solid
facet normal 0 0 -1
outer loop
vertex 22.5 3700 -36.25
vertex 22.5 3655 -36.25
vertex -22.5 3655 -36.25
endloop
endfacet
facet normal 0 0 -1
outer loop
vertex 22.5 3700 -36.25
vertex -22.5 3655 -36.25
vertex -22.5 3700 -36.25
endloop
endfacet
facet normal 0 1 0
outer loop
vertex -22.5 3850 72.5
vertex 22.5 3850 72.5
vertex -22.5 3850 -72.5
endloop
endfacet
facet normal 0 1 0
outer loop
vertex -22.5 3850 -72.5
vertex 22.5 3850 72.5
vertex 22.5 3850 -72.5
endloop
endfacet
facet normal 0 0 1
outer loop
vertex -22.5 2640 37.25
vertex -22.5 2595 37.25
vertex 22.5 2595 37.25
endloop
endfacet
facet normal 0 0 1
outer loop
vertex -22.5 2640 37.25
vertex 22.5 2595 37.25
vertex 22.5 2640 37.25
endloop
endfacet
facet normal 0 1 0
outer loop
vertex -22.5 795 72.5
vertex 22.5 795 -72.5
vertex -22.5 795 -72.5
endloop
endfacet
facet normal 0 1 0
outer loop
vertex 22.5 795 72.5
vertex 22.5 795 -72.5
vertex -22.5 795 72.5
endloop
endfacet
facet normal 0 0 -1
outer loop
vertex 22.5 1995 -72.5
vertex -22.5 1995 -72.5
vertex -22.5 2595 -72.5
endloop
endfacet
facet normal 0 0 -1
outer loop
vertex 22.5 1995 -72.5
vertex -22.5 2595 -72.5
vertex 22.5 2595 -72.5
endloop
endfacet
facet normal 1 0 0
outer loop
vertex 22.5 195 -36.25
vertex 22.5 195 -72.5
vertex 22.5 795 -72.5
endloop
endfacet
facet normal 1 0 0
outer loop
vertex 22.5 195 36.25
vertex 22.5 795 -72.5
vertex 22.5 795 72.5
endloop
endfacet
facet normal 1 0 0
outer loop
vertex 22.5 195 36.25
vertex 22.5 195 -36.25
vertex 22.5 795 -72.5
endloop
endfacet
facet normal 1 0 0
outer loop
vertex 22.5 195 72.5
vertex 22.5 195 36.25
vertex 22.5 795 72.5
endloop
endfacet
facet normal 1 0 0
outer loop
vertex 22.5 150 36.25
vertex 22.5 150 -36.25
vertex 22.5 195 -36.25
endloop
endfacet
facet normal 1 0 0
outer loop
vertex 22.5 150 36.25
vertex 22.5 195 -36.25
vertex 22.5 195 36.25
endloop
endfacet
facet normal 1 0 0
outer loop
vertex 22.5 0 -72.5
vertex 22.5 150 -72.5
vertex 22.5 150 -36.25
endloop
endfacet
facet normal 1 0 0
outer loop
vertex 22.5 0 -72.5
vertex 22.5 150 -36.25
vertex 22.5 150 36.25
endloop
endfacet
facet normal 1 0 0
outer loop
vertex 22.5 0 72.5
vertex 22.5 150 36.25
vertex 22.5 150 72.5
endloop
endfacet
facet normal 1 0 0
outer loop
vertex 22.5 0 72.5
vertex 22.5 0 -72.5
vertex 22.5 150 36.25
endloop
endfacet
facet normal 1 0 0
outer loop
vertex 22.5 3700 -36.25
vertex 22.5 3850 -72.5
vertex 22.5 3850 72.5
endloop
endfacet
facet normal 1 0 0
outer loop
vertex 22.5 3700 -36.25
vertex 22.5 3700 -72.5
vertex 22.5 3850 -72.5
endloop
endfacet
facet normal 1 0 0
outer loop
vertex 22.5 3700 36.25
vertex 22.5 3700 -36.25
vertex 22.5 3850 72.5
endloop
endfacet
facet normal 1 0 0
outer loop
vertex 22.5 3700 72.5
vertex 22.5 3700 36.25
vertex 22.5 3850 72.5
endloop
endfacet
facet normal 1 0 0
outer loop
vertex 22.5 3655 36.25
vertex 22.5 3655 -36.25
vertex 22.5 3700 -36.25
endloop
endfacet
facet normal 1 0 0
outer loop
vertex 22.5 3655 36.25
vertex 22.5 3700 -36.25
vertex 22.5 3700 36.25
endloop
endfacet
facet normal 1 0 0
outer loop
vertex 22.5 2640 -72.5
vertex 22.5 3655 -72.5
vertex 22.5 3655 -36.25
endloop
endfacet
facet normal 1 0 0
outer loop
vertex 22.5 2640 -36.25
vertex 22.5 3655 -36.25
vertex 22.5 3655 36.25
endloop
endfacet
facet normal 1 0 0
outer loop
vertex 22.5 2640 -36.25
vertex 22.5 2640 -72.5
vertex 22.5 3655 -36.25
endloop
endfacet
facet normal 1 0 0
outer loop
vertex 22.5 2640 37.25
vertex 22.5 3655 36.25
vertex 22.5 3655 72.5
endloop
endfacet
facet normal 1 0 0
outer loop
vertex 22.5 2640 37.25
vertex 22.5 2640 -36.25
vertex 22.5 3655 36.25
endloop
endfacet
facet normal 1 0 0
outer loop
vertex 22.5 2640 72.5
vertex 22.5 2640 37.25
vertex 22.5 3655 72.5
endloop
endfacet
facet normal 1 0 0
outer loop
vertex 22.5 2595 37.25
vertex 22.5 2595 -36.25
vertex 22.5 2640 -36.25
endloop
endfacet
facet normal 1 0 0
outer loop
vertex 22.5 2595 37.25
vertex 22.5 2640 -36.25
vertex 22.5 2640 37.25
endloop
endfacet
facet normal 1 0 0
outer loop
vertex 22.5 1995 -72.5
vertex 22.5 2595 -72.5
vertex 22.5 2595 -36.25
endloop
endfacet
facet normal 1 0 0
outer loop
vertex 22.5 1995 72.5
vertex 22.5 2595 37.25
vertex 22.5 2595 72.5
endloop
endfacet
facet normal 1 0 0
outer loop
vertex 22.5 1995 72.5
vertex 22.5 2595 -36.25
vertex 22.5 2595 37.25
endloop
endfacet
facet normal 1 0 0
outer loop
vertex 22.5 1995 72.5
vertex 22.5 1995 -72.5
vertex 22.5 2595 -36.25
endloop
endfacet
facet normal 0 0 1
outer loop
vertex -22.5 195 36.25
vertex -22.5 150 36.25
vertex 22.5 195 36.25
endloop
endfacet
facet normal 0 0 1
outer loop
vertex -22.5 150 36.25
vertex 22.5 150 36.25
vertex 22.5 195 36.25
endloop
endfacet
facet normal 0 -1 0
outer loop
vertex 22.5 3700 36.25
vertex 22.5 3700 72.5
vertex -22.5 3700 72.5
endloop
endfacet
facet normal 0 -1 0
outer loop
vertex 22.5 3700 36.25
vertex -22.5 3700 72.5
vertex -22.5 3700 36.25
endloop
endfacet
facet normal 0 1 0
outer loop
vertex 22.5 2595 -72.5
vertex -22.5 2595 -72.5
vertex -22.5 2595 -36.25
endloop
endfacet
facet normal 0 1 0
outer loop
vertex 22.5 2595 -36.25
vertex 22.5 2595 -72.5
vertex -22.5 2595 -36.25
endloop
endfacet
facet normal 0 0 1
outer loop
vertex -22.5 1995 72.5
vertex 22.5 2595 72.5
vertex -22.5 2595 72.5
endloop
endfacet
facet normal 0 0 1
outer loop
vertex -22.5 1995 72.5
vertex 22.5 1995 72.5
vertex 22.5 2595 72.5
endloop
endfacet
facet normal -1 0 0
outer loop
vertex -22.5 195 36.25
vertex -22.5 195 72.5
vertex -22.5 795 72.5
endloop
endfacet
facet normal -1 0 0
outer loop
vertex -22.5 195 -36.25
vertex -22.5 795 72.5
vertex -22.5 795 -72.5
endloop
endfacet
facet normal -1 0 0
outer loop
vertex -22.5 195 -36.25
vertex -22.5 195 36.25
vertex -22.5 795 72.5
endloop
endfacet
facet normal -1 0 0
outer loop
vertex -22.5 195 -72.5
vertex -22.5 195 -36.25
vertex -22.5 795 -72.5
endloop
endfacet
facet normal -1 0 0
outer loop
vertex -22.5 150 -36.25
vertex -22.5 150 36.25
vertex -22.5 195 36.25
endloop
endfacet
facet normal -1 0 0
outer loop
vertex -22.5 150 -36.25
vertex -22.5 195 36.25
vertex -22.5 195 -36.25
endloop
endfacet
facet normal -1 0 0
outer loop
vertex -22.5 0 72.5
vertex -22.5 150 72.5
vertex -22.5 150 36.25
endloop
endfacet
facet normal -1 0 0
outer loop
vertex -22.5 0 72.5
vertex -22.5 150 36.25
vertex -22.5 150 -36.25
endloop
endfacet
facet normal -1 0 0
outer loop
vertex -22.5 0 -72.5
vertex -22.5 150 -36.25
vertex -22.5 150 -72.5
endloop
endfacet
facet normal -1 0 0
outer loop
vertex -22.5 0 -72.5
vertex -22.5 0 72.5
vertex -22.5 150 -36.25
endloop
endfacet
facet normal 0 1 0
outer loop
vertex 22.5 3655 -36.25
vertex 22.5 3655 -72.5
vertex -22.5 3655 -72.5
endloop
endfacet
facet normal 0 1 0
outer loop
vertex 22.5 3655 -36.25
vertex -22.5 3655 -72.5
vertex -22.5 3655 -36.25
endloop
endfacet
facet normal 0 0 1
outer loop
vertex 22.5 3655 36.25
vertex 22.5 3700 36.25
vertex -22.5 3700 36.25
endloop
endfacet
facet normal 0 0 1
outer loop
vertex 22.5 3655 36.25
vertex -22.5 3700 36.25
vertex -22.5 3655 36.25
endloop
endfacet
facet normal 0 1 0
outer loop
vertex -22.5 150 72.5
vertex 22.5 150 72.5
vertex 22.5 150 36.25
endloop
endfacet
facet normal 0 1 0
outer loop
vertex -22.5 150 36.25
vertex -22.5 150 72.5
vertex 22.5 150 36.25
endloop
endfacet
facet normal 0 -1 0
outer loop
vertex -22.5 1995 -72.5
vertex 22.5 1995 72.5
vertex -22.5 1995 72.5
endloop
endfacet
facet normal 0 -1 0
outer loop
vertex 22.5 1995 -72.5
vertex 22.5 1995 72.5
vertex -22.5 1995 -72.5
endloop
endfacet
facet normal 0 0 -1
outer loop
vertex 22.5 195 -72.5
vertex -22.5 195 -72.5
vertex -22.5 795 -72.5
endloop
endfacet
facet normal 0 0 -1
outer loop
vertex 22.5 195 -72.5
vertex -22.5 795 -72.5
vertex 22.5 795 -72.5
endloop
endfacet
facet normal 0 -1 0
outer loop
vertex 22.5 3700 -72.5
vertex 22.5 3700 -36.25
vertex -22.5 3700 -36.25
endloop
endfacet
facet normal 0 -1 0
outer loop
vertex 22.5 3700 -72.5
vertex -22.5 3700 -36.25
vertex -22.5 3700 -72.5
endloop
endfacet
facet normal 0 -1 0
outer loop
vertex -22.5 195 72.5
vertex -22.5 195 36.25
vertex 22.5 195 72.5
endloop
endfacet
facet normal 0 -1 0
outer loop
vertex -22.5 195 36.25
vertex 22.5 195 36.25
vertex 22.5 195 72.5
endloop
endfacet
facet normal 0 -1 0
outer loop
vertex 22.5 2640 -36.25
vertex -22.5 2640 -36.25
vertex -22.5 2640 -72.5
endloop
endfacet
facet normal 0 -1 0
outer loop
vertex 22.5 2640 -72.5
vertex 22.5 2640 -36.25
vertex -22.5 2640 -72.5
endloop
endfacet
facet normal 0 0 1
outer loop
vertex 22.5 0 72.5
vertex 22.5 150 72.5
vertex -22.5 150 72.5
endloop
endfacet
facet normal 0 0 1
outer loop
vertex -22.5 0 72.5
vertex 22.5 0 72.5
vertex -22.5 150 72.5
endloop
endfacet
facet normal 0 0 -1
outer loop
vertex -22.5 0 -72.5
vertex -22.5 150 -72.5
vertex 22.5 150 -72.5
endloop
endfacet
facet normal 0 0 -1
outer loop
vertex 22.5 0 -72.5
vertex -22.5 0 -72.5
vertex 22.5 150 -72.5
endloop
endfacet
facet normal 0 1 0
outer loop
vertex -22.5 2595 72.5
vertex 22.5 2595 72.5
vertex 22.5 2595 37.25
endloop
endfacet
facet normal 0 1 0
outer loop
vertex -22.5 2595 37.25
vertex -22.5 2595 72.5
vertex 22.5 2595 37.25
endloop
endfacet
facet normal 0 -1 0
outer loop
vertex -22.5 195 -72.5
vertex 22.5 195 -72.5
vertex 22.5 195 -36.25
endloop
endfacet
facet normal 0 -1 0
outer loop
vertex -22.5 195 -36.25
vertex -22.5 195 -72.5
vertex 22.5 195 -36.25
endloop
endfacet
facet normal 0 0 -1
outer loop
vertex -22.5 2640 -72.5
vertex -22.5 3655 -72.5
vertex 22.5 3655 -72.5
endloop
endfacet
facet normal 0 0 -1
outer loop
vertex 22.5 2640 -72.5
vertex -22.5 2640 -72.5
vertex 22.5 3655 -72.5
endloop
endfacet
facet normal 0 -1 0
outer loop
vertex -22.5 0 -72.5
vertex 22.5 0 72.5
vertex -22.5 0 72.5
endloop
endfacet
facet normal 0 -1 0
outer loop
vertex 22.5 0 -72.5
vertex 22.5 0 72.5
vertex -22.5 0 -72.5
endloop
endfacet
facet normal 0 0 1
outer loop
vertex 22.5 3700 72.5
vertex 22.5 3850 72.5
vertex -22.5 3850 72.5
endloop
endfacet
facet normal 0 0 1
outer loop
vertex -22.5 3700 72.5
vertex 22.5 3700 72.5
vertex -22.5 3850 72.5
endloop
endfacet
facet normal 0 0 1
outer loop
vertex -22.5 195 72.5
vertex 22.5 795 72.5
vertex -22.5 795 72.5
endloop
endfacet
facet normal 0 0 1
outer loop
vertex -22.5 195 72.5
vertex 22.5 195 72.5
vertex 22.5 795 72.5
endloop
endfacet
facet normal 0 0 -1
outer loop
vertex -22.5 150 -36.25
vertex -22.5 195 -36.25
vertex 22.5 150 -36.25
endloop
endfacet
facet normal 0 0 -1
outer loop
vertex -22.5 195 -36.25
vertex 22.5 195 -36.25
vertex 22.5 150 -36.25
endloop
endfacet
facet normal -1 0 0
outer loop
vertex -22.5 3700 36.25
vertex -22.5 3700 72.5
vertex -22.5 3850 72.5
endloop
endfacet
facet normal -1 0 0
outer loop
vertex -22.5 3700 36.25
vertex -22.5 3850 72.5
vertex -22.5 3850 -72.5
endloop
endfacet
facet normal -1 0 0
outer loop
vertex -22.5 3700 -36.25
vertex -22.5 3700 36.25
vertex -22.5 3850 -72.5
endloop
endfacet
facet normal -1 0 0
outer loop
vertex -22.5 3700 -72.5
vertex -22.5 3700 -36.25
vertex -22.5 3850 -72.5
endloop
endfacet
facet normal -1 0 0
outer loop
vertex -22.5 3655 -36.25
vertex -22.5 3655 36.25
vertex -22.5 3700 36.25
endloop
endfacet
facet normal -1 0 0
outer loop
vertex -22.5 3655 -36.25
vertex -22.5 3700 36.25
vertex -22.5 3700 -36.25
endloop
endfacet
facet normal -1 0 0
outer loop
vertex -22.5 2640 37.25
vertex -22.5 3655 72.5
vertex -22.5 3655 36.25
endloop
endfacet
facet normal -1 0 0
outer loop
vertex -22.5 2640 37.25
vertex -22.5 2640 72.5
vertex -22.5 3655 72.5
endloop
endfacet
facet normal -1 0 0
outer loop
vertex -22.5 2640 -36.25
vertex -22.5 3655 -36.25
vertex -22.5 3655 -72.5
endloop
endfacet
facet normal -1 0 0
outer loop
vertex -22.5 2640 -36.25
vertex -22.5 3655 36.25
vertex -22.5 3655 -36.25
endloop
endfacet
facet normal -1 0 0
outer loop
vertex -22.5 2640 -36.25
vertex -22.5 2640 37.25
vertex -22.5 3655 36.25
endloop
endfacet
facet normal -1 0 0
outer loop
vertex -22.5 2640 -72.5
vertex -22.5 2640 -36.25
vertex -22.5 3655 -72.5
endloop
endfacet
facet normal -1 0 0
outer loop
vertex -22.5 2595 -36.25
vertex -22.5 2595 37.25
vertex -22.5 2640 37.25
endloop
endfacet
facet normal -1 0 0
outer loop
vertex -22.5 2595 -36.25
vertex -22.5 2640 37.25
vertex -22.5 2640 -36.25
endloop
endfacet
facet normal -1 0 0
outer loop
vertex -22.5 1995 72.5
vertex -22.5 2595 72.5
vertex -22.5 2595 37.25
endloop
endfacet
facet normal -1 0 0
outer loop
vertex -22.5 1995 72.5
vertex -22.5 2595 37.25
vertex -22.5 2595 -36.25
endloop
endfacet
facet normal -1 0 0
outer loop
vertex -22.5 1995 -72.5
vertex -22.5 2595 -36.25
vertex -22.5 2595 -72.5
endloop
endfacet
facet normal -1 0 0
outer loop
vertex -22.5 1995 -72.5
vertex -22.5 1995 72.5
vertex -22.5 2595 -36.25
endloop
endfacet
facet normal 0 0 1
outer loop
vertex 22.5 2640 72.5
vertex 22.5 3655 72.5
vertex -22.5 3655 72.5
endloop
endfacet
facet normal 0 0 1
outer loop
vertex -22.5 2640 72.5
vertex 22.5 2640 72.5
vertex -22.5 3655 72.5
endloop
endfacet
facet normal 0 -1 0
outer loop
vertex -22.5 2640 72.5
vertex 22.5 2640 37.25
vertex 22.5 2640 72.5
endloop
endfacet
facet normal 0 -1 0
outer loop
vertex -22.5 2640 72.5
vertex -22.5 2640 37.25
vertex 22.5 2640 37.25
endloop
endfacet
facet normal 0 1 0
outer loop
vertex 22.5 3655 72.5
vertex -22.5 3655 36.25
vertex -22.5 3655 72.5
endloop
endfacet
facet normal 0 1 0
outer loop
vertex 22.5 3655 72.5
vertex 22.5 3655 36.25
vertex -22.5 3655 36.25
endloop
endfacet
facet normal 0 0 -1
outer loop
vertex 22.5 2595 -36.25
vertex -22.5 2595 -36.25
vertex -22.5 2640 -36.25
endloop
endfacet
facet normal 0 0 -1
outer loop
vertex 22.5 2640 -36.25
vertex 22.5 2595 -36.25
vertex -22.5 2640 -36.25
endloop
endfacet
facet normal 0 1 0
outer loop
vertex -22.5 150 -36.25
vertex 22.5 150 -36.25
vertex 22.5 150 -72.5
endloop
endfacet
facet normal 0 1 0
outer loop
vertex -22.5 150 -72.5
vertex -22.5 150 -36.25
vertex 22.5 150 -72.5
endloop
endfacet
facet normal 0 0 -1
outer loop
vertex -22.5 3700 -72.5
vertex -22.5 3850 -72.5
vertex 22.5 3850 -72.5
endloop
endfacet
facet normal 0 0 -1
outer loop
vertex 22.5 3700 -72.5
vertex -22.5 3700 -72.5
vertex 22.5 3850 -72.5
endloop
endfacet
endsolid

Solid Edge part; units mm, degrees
sketch "Sketch1" plane through (0, 0, 0) normal (0, -1, 0) x (1, 0, 0)
  line L0 (-22.5, -72.5) -> (22.5, -72.5)
  line L1 (22.5, -72.5) -> (22.5, 72.5)
  line L2 (22.5, 72.5) -> (-22.5, 72.5)
  line L3 (-22.5, 72.5) -> (-22.5, -72.5)
extrude "Protrusion1" add sketch "Sketch1" against normal blind 3850
sketch "Sketch2" plane through (22.5, 1925, 0) normal (1, 0, 0) x (0, 1, 0)
  line L0 (1775, 72.5) -> (1775, 36.25)
  line L1 (1775, 36.25) -> (1730, 36.25)
  line L2 (1730, 36.25) -> (1730, 72.5)
  line L3 (1730, 72.5) -> (1775, 72.5)
  line L4 (-1775, 72.5) -> (-1775, 36.25)
  line L5 (-1775, 36.25) -> (-1730, 36.25)
  line L6 (-1730, 36.25) -> (-1730, 72.5)
  line L7 (-1730, 72.5) -> (-1775, 72.5)
extrude "ExtrudedCutout_1" cut sketch "Sketch2" against normal blind 86.6929
mirror "Mirror1" about plane through (0, 0, 0) normal (0, 0, -1) of "ExtrudedCutout_1"
sketch "Sketch3" plane through (-22.5, 1925, 0) normal (-1, 0, 0) x (0, -1, 0)
  line L0 (-670, 72.5) -> (-715, 72.5)
  line L1 (-715, 37.25) -> (-715, 72.5)
  line L2 (-670, 37.25) -> (-715, 37.25)
  line L3 (-670, 72.5) -> (-670, 37.25)
  line L4 (-715, -72.5) -> (-670, -72.5)
  line L5 (-670, -72.5) -> (-670, -36.25)
  line L6 (-670, -36.25) -> (-715, -36.25)
  line L7 (-715, -36.25) -> (-715, -72.5)
extrude "ExtrudedCutout_2" cut sketch "Sketch3" against normal blind 78.7482
sketch "Sketch4" plane through (22.5, 1925, 0) normal (1, 0, 0) x (0, 1, 0)
  line L0 (-1130, 72.5) -> (70, 72.5)
  line L1 (70, 72.5) -> (70, -72.5)
  line L2 (70, -72.5) -> (-1130, -72.5)
  line L3 (-1130, -72.5) -> (-1130, 72.5)
extrude "ExtrudedCutout_4" cut sketch "Sketch4" against normal blind 117.5606
properties material "Wood, Pine"
